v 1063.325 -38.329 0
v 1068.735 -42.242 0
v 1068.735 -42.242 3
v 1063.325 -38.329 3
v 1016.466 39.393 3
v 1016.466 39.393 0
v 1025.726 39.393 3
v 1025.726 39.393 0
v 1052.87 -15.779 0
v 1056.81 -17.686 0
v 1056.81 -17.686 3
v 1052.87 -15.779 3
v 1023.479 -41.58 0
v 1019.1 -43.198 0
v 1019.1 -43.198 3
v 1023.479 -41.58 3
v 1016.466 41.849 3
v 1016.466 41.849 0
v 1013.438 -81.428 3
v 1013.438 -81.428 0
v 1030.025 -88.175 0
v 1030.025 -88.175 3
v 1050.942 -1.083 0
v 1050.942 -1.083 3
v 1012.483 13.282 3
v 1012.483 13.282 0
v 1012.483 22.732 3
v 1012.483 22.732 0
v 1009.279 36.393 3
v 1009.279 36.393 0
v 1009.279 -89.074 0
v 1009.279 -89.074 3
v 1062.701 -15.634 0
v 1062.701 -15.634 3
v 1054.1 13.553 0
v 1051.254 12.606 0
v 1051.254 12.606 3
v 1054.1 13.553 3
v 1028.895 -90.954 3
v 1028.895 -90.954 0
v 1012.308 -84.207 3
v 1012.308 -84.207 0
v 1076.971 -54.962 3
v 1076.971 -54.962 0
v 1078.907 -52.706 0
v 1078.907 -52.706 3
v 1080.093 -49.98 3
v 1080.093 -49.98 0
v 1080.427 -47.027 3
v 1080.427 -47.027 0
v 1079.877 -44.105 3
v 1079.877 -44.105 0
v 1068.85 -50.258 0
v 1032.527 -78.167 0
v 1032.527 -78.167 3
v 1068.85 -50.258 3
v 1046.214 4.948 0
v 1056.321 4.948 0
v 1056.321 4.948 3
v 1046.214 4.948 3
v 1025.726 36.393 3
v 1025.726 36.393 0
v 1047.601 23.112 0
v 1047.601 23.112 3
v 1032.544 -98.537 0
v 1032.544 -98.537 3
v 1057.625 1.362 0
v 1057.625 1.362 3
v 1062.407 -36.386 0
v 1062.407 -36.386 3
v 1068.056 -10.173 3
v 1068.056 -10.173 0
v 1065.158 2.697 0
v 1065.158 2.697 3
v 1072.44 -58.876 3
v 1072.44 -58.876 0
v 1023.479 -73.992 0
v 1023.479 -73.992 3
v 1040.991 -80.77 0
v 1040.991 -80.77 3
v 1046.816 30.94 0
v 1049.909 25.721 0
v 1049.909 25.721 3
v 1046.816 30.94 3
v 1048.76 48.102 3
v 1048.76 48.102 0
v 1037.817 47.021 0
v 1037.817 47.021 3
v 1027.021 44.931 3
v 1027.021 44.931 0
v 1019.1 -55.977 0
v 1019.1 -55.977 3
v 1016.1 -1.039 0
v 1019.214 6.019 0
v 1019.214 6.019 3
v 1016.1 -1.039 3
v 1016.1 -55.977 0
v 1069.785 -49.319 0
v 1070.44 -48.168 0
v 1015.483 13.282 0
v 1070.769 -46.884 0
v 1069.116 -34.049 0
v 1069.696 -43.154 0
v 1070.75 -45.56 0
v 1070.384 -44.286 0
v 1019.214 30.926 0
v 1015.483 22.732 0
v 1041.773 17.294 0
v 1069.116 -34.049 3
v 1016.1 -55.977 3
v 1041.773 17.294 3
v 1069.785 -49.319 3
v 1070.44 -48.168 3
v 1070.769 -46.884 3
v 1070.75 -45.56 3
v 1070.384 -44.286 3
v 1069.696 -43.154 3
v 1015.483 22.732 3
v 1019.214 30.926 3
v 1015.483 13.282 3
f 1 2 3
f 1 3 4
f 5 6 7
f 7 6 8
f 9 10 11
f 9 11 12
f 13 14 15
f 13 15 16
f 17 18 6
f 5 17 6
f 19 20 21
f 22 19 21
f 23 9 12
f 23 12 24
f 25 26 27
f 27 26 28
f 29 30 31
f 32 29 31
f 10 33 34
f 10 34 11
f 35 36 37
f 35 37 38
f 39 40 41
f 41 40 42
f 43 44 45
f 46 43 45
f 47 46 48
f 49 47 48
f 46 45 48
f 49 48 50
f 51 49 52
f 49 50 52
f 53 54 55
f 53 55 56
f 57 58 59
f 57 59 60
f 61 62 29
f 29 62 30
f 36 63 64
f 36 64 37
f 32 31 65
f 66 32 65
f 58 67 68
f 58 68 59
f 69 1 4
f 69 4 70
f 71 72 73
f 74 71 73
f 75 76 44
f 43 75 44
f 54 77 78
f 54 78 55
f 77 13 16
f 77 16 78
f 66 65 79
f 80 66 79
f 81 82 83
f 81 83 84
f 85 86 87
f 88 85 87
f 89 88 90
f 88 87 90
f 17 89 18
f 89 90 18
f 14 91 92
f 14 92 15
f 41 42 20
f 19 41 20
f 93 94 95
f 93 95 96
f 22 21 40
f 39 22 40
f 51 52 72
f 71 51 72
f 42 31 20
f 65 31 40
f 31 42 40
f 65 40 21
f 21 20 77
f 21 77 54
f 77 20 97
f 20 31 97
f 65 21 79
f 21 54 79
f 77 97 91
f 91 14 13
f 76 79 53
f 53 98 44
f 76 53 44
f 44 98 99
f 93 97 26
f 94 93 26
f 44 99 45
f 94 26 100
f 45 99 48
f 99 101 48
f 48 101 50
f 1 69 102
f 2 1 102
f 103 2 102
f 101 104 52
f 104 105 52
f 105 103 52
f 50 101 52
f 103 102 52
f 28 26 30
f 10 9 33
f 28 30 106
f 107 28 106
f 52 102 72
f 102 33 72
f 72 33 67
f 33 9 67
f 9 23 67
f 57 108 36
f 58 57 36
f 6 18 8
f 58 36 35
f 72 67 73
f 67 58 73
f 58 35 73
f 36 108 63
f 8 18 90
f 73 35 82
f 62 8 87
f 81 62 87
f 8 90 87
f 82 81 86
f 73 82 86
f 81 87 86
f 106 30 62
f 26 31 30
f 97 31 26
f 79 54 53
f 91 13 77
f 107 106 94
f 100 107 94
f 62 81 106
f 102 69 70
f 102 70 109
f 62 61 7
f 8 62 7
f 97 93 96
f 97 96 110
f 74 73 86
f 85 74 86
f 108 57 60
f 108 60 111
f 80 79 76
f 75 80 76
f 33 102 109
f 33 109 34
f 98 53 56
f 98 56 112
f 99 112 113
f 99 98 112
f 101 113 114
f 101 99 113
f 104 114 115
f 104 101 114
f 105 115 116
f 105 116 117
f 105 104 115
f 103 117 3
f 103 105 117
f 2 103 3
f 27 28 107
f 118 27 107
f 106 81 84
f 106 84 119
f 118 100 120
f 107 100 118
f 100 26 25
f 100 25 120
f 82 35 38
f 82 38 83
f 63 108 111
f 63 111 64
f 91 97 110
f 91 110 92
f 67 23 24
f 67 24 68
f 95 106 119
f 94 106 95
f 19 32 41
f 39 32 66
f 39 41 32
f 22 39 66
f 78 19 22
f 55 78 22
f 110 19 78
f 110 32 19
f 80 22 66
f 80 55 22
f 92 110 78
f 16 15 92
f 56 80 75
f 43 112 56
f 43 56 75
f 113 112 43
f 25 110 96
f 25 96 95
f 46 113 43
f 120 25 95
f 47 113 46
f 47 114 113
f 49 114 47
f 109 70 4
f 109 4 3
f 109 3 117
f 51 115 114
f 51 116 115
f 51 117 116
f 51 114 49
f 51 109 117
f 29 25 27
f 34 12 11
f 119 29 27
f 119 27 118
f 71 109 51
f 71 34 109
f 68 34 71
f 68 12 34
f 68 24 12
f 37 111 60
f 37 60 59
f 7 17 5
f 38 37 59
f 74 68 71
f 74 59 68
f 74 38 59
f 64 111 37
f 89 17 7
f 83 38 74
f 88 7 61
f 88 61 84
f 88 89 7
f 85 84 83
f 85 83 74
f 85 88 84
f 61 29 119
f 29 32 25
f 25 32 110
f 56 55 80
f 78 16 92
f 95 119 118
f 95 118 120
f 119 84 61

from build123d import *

# Parameters (mm, degrees)
SKETCH1_W           = 3
SKETCH1_H           = 9.45
BASE_EXTRUDE_DEPTH  = 3
SKETCH2_W           = 10
SKETCH2_H           = 3
BOSS_EXTRUDE1_DEPTH = 3


with BuildPart() as part:
    # Sketch1 → Base-Extrude (new body)
    with BuildSketch(Plane.XY):
        with BuildLine():
            Line((1079.876919763, -44.105153511), (1068.056216666, -10.172974917))
            Line((1068.056216666, -10.172974917), (1065.157526034, 2.696840543))
            Line((1065.157526034, 2.696840543), (1048.759611565, 48.101577381))
            ThreePointArc((1048.759611565, 48.101577381), (1032.394850119, 46.101647559), (1016.466345621, 41.848662618))
            Line((1016.466345621, 41.848662618), (1016.466345621, 39.392602571))
            Line((1016.466345621, 39.392602571), (1035.726137056, 39.392602571))
            Line((1035.726137056, 39.392602571), (1035.726137056, 36.392602571))
            Line((1035.726137056, 36.392602571), (1009.279499751, 36.392602571))
            Line((1009.279499751, 36.392602571), (1009.279499751, -89.073987735))
            Line((1009.279499751, -89.073987735), (1032.543515661, -98.536722682))
            Line((1032.543515661, -98.536722682), (1040.991113984, -80.770341528))
            Line((1040.991113984, -80.770341528), (1072.440441541, -58.876157059))
            Line((1072.440441541, -58.876157059), (1076.9710582, -54.961956755))
            ThreePointArc((1076.9710582, -54.961956755), (1080.093496996, -49.980404823), (1079.876919763, -44.105153511))
        make_face()
        with BuildLine():
            Line((1019.213878108, 30.925856164), (1019.213878108, 6.018771541))
            Line((1019.213878108, 6.018771541), (1016.100082492, -1.038872257))
            Line((1016.100082492, -1.038872257), (1016.100082492, -55.976738358))
            Line((1016.100082492, -55.976738358), (1019.100082492, -55.976738358))
            Line((1019.100082492, -55.976738358), (1019.100082492, -43.198135443))
            Line((1019.100082492, -43.198135443), (1023.478597046, -41.580404808))
            Line((1023.478597046, -41.580404808), (1023.478597046, -73.992128786))
            Line((1023.478597046, -73.992128786), (1032.526582577, -78.167039678))
            Line((1032.526582577, -78.167039678), (1068.850484509, -50.258348586))
            ThreePointArc((1068.850484509, -50.258348586), (1070.803657728, -46.221334872), (1068.734776871, -42.242378056))
            Line((1068.734776871, -42.242378056), (1063.325122863, -38.329012558))
            Line((1063.325122863, -38.329012558), (1062.407393196, -36.386031272))
            Line((1062.407393196, -36.386031272), (1069.115709638, -34.04910449))
            Line((1069.115709638, -34.04910449), (1062.700744223, -15.634484789))
            Line((1062.700744223, -15.634484789), (1056.810312455, -17.686491112))
            Line((1056.810312455, -17.686491112), (1052.869598475, -15.779326268))
            Line((1052.869598475, -15.779326268), (1050.941521122, -1.083078235))
            Line((1050.941521122, -1.083078235), (1057.625060998, 1.362146575))
            Line((1057.625060998, 1.362146575), (1056.321001716, 4.948397029))
            Line((1056.321001716, 4.948397029), (1046.214175082, 4.948397029))
            Line((1046.214175082, 4.948397029), (1041.773169547, 17.294470752))
            Line((1041.773169547, 17.294470752), (1047.600835278, 23.111994965))
            Line((1047.600835278, 23.111994965), (1051.253809923, 12.605592538))
            Line((1051.253809923, 12.605592538), (1054.100349004, 13.552807012))
            Line((1054.100349004, 13.552807012), (1049.909104568, 25.720739733))
            Line((1049.909104568, 25.720739733), (1046.816291402, 30.939914406))
            Line((1046.816291402, 30.939914406), (1019.213878108, 30.925856164))
        make_face(mode=Mode.SUBTRACT)
        Polygon((1012.307844389, -84.207250741), (1013.438177941, -81.428339792), (1030.025357256, -88.175243766), (1028.895023704, -90.954154714), align=None, mode=Mode.SUBTRACT)
        with Locations((1013.982987836, 18.006853638)):
            Rectangle(SKETCH1_W, SKETCH1_H, mode=Mode.SUBTRACT)
    extrude(amount=BASE_EXTRUDE_DEPTH)

    # Sketch2 → Boss-Extrude1 (add)
    with BuildSketch(Plane.XY.offset(3)):
        with Locations((1030.726137056, 37.892602571)):
            Rectangle(SKETCH2_W, SKETCH2_H)
    extrude(amount=-BOSS_EXTRUDE1_DEPTH)


solid = part.part
